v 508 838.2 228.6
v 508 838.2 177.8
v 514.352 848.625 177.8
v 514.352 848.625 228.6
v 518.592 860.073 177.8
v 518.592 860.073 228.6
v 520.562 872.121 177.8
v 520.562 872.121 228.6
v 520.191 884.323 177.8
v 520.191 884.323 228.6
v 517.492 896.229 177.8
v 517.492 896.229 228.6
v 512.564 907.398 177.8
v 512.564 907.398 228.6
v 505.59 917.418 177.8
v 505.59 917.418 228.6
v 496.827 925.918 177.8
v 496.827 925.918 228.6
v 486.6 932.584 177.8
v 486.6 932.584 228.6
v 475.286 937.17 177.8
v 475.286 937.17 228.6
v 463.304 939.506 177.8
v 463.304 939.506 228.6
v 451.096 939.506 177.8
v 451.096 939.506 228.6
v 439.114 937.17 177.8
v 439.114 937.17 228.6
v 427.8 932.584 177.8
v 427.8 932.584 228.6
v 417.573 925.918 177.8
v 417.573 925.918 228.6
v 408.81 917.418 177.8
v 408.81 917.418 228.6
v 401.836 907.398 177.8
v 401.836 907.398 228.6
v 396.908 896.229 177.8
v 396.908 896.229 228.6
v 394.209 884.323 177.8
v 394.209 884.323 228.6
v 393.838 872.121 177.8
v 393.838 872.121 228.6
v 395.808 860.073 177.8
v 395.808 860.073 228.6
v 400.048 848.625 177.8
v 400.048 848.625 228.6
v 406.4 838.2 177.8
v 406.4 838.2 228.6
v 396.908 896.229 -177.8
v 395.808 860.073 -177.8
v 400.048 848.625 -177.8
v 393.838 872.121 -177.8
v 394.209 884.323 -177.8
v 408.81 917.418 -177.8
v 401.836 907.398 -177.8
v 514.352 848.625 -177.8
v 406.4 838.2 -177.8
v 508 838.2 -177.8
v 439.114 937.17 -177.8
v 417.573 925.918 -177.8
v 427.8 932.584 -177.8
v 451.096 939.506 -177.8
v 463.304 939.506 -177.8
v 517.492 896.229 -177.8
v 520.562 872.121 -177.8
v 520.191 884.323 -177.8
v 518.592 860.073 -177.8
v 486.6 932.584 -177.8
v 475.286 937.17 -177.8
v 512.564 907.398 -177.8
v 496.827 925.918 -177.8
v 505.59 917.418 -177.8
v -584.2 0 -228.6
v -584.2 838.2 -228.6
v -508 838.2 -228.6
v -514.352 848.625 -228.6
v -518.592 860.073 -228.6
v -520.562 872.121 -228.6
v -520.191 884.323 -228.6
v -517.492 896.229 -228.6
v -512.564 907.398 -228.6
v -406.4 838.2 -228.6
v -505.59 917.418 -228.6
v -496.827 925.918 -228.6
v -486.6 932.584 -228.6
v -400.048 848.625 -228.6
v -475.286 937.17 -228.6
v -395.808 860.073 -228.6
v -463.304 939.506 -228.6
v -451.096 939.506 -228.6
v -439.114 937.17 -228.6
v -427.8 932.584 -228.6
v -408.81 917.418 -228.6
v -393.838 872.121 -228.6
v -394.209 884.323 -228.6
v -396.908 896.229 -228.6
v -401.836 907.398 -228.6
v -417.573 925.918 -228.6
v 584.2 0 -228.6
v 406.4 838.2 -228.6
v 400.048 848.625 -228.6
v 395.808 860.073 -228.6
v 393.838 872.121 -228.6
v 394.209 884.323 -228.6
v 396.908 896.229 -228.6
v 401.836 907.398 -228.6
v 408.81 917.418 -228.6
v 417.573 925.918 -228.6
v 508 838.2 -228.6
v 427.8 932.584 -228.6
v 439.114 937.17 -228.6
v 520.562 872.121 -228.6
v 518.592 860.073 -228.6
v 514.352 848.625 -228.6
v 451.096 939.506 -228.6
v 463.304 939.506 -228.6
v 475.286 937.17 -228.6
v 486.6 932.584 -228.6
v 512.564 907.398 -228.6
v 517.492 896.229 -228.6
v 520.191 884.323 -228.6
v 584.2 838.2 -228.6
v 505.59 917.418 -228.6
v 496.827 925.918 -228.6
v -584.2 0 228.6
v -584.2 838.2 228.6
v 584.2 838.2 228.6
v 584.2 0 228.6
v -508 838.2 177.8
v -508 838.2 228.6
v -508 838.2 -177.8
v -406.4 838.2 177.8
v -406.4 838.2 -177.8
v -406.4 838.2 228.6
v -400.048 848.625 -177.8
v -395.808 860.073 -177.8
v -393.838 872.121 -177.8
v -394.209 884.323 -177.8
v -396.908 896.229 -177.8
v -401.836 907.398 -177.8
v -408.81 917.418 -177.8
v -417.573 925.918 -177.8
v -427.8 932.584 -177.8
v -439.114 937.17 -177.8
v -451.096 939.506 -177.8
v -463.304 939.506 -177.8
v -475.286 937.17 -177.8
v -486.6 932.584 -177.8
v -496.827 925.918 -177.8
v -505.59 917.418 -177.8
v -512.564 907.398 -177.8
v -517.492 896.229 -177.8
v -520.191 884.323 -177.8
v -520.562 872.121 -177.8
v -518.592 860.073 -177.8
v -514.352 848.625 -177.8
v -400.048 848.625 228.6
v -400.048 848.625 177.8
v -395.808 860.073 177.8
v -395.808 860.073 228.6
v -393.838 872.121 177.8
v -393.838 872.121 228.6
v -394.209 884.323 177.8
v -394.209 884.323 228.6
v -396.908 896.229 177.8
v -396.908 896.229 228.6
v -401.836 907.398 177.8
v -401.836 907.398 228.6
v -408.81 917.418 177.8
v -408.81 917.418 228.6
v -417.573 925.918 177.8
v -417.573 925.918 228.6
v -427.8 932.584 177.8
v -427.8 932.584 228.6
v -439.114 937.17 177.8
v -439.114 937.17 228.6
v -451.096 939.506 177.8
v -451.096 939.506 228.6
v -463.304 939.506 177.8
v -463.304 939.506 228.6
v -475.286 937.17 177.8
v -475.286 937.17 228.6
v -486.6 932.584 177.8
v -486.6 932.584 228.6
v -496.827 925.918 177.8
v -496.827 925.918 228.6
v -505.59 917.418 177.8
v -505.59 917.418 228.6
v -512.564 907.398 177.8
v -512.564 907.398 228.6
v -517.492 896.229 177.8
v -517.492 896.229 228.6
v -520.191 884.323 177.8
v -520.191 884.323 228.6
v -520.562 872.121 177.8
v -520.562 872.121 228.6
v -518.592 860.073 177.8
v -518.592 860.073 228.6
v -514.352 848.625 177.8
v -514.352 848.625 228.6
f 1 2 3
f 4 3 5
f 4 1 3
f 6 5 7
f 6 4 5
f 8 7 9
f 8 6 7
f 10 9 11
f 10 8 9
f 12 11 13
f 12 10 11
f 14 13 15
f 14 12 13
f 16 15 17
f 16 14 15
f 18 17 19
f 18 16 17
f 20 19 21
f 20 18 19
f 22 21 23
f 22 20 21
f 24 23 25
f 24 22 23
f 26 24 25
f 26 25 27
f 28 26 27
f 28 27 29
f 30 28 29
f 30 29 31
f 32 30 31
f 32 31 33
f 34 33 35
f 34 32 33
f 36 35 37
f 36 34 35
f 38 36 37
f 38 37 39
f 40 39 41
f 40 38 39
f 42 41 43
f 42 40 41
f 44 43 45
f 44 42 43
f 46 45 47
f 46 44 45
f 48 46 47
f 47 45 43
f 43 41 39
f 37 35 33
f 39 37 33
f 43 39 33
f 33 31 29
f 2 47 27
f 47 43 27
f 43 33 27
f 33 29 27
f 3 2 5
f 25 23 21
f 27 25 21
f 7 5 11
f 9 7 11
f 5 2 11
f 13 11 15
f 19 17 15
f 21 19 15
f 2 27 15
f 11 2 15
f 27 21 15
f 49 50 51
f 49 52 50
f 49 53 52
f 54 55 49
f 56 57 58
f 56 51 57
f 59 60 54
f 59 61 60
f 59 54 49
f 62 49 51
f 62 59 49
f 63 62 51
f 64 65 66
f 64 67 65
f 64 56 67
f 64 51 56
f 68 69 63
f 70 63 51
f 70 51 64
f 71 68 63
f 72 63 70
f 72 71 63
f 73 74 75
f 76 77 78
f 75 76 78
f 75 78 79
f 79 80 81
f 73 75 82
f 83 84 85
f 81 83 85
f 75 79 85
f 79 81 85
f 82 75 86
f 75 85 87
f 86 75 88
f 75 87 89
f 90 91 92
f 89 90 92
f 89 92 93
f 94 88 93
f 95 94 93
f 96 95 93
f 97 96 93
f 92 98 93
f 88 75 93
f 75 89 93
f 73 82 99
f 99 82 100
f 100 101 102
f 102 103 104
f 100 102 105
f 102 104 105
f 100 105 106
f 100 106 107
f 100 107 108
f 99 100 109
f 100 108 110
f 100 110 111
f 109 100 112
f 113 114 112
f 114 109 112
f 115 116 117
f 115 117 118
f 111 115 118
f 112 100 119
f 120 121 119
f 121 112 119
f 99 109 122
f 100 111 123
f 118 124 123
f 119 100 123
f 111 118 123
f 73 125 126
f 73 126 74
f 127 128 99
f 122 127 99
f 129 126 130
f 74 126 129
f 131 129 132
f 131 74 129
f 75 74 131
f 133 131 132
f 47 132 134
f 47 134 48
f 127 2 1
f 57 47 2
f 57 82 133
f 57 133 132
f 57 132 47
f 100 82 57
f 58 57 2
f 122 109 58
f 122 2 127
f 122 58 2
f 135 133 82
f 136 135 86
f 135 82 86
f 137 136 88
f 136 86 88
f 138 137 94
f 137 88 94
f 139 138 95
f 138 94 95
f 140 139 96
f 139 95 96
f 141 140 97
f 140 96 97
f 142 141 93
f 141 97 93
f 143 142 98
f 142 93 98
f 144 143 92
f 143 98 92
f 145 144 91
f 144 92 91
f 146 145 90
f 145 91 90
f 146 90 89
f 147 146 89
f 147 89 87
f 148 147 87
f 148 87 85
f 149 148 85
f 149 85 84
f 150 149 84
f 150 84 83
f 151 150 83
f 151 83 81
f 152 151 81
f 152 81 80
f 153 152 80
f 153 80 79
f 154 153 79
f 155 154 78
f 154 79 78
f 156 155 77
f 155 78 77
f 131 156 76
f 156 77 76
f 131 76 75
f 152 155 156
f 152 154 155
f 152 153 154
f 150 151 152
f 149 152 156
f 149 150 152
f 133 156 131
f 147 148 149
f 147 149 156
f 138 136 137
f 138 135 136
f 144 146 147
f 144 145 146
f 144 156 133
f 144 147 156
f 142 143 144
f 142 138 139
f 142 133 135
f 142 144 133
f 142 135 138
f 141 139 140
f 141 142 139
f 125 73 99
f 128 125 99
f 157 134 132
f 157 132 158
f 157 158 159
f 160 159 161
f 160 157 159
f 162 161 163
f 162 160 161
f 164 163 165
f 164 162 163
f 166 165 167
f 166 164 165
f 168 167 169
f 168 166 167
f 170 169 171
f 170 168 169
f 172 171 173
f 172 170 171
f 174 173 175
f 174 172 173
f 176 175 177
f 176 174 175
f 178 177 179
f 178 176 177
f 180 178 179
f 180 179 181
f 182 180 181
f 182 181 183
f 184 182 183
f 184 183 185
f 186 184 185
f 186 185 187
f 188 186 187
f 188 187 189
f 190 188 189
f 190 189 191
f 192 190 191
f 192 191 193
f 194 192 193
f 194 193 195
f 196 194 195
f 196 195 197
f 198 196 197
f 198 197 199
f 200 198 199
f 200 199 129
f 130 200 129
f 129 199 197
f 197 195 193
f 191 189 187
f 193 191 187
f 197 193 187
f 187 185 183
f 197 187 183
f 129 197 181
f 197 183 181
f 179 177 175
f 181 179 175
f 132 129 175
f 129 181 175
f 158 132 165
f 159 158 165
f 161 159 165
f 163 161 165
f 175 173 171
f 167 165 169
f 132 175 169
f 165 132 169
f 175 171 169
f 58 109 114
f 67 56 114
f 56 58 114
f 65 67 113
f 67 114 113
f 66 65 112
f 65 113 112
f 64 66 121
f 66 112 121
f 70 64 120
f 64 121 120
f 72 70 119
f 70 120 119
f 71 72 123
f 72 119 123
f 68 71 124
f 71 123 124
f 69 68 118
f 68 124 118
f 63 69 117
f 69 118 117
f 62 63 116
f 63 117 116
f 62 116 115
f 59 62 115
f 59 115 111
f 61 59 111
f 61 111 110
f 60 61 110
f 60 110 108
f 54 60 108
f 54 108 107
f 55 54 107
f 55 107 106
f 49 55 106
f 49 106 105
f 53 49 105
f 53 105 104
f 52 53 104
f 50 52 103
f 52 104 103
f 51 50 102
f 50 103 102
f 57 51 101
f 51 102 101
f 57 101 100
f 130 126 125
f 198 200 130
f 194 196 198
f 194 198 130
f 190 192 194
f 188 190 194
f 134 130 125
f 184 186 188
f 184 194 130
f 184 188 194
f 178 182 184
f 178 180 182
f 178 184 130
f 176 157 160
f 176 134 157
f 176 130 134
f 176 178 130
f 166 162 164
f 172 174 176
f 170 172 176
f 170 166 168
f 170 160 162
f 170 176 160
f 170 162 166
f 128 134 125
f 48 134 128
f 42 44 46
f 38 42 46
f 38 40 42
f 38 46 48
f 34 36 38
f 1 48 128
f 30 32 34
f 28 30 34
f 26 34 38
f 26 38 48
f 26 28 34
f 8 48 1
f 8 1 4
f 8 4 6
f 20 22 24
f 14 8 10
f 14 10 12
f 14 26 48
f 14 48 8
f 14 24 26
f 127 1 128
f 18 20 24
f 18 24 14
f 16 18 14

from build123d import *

# Parameters (mm, degrees)
SKETCH1_W           = 1168.4
SKETCH1_H           = 457.2
BOSS_EXTRUDE1_DEPTH = 838.2
SKETCH2_R           = 63.5
BOSS_EXTRUDE2_DEPTH = 50.8


with BuildPart() as part:
    # Sketch1 → Boss-Extrude1 (new body)
    with BuildSketch(Plane(origin=(0, 0, 0), x_dir=(1, 0, 0), z_dir=(0, 1, 0))):
        Rectangle(SKETCH1_W, SKETCH1_H)
    extrude(amount=BOSS_EXTRUDE1_DEPTH)

    # Sketch2 → Boss-Extrude2 (add)
    with BuildSketch(Plane.XY.offset(228.6)):
        with Locations((-457.2, 876.3)):
            Circle(SKETCH2_R)
        with Locations((457.2, 876.3)):
            Circle(SKETCH2_R)
    boss_extrude2 = extrude(amount=-BOSS_EXTRUDE2_DEPTH)

    # Mirror1: Boss-Extrude2 across plane
    add(boss_extrude2.mirror(Plane.XY))


solid = part.part
